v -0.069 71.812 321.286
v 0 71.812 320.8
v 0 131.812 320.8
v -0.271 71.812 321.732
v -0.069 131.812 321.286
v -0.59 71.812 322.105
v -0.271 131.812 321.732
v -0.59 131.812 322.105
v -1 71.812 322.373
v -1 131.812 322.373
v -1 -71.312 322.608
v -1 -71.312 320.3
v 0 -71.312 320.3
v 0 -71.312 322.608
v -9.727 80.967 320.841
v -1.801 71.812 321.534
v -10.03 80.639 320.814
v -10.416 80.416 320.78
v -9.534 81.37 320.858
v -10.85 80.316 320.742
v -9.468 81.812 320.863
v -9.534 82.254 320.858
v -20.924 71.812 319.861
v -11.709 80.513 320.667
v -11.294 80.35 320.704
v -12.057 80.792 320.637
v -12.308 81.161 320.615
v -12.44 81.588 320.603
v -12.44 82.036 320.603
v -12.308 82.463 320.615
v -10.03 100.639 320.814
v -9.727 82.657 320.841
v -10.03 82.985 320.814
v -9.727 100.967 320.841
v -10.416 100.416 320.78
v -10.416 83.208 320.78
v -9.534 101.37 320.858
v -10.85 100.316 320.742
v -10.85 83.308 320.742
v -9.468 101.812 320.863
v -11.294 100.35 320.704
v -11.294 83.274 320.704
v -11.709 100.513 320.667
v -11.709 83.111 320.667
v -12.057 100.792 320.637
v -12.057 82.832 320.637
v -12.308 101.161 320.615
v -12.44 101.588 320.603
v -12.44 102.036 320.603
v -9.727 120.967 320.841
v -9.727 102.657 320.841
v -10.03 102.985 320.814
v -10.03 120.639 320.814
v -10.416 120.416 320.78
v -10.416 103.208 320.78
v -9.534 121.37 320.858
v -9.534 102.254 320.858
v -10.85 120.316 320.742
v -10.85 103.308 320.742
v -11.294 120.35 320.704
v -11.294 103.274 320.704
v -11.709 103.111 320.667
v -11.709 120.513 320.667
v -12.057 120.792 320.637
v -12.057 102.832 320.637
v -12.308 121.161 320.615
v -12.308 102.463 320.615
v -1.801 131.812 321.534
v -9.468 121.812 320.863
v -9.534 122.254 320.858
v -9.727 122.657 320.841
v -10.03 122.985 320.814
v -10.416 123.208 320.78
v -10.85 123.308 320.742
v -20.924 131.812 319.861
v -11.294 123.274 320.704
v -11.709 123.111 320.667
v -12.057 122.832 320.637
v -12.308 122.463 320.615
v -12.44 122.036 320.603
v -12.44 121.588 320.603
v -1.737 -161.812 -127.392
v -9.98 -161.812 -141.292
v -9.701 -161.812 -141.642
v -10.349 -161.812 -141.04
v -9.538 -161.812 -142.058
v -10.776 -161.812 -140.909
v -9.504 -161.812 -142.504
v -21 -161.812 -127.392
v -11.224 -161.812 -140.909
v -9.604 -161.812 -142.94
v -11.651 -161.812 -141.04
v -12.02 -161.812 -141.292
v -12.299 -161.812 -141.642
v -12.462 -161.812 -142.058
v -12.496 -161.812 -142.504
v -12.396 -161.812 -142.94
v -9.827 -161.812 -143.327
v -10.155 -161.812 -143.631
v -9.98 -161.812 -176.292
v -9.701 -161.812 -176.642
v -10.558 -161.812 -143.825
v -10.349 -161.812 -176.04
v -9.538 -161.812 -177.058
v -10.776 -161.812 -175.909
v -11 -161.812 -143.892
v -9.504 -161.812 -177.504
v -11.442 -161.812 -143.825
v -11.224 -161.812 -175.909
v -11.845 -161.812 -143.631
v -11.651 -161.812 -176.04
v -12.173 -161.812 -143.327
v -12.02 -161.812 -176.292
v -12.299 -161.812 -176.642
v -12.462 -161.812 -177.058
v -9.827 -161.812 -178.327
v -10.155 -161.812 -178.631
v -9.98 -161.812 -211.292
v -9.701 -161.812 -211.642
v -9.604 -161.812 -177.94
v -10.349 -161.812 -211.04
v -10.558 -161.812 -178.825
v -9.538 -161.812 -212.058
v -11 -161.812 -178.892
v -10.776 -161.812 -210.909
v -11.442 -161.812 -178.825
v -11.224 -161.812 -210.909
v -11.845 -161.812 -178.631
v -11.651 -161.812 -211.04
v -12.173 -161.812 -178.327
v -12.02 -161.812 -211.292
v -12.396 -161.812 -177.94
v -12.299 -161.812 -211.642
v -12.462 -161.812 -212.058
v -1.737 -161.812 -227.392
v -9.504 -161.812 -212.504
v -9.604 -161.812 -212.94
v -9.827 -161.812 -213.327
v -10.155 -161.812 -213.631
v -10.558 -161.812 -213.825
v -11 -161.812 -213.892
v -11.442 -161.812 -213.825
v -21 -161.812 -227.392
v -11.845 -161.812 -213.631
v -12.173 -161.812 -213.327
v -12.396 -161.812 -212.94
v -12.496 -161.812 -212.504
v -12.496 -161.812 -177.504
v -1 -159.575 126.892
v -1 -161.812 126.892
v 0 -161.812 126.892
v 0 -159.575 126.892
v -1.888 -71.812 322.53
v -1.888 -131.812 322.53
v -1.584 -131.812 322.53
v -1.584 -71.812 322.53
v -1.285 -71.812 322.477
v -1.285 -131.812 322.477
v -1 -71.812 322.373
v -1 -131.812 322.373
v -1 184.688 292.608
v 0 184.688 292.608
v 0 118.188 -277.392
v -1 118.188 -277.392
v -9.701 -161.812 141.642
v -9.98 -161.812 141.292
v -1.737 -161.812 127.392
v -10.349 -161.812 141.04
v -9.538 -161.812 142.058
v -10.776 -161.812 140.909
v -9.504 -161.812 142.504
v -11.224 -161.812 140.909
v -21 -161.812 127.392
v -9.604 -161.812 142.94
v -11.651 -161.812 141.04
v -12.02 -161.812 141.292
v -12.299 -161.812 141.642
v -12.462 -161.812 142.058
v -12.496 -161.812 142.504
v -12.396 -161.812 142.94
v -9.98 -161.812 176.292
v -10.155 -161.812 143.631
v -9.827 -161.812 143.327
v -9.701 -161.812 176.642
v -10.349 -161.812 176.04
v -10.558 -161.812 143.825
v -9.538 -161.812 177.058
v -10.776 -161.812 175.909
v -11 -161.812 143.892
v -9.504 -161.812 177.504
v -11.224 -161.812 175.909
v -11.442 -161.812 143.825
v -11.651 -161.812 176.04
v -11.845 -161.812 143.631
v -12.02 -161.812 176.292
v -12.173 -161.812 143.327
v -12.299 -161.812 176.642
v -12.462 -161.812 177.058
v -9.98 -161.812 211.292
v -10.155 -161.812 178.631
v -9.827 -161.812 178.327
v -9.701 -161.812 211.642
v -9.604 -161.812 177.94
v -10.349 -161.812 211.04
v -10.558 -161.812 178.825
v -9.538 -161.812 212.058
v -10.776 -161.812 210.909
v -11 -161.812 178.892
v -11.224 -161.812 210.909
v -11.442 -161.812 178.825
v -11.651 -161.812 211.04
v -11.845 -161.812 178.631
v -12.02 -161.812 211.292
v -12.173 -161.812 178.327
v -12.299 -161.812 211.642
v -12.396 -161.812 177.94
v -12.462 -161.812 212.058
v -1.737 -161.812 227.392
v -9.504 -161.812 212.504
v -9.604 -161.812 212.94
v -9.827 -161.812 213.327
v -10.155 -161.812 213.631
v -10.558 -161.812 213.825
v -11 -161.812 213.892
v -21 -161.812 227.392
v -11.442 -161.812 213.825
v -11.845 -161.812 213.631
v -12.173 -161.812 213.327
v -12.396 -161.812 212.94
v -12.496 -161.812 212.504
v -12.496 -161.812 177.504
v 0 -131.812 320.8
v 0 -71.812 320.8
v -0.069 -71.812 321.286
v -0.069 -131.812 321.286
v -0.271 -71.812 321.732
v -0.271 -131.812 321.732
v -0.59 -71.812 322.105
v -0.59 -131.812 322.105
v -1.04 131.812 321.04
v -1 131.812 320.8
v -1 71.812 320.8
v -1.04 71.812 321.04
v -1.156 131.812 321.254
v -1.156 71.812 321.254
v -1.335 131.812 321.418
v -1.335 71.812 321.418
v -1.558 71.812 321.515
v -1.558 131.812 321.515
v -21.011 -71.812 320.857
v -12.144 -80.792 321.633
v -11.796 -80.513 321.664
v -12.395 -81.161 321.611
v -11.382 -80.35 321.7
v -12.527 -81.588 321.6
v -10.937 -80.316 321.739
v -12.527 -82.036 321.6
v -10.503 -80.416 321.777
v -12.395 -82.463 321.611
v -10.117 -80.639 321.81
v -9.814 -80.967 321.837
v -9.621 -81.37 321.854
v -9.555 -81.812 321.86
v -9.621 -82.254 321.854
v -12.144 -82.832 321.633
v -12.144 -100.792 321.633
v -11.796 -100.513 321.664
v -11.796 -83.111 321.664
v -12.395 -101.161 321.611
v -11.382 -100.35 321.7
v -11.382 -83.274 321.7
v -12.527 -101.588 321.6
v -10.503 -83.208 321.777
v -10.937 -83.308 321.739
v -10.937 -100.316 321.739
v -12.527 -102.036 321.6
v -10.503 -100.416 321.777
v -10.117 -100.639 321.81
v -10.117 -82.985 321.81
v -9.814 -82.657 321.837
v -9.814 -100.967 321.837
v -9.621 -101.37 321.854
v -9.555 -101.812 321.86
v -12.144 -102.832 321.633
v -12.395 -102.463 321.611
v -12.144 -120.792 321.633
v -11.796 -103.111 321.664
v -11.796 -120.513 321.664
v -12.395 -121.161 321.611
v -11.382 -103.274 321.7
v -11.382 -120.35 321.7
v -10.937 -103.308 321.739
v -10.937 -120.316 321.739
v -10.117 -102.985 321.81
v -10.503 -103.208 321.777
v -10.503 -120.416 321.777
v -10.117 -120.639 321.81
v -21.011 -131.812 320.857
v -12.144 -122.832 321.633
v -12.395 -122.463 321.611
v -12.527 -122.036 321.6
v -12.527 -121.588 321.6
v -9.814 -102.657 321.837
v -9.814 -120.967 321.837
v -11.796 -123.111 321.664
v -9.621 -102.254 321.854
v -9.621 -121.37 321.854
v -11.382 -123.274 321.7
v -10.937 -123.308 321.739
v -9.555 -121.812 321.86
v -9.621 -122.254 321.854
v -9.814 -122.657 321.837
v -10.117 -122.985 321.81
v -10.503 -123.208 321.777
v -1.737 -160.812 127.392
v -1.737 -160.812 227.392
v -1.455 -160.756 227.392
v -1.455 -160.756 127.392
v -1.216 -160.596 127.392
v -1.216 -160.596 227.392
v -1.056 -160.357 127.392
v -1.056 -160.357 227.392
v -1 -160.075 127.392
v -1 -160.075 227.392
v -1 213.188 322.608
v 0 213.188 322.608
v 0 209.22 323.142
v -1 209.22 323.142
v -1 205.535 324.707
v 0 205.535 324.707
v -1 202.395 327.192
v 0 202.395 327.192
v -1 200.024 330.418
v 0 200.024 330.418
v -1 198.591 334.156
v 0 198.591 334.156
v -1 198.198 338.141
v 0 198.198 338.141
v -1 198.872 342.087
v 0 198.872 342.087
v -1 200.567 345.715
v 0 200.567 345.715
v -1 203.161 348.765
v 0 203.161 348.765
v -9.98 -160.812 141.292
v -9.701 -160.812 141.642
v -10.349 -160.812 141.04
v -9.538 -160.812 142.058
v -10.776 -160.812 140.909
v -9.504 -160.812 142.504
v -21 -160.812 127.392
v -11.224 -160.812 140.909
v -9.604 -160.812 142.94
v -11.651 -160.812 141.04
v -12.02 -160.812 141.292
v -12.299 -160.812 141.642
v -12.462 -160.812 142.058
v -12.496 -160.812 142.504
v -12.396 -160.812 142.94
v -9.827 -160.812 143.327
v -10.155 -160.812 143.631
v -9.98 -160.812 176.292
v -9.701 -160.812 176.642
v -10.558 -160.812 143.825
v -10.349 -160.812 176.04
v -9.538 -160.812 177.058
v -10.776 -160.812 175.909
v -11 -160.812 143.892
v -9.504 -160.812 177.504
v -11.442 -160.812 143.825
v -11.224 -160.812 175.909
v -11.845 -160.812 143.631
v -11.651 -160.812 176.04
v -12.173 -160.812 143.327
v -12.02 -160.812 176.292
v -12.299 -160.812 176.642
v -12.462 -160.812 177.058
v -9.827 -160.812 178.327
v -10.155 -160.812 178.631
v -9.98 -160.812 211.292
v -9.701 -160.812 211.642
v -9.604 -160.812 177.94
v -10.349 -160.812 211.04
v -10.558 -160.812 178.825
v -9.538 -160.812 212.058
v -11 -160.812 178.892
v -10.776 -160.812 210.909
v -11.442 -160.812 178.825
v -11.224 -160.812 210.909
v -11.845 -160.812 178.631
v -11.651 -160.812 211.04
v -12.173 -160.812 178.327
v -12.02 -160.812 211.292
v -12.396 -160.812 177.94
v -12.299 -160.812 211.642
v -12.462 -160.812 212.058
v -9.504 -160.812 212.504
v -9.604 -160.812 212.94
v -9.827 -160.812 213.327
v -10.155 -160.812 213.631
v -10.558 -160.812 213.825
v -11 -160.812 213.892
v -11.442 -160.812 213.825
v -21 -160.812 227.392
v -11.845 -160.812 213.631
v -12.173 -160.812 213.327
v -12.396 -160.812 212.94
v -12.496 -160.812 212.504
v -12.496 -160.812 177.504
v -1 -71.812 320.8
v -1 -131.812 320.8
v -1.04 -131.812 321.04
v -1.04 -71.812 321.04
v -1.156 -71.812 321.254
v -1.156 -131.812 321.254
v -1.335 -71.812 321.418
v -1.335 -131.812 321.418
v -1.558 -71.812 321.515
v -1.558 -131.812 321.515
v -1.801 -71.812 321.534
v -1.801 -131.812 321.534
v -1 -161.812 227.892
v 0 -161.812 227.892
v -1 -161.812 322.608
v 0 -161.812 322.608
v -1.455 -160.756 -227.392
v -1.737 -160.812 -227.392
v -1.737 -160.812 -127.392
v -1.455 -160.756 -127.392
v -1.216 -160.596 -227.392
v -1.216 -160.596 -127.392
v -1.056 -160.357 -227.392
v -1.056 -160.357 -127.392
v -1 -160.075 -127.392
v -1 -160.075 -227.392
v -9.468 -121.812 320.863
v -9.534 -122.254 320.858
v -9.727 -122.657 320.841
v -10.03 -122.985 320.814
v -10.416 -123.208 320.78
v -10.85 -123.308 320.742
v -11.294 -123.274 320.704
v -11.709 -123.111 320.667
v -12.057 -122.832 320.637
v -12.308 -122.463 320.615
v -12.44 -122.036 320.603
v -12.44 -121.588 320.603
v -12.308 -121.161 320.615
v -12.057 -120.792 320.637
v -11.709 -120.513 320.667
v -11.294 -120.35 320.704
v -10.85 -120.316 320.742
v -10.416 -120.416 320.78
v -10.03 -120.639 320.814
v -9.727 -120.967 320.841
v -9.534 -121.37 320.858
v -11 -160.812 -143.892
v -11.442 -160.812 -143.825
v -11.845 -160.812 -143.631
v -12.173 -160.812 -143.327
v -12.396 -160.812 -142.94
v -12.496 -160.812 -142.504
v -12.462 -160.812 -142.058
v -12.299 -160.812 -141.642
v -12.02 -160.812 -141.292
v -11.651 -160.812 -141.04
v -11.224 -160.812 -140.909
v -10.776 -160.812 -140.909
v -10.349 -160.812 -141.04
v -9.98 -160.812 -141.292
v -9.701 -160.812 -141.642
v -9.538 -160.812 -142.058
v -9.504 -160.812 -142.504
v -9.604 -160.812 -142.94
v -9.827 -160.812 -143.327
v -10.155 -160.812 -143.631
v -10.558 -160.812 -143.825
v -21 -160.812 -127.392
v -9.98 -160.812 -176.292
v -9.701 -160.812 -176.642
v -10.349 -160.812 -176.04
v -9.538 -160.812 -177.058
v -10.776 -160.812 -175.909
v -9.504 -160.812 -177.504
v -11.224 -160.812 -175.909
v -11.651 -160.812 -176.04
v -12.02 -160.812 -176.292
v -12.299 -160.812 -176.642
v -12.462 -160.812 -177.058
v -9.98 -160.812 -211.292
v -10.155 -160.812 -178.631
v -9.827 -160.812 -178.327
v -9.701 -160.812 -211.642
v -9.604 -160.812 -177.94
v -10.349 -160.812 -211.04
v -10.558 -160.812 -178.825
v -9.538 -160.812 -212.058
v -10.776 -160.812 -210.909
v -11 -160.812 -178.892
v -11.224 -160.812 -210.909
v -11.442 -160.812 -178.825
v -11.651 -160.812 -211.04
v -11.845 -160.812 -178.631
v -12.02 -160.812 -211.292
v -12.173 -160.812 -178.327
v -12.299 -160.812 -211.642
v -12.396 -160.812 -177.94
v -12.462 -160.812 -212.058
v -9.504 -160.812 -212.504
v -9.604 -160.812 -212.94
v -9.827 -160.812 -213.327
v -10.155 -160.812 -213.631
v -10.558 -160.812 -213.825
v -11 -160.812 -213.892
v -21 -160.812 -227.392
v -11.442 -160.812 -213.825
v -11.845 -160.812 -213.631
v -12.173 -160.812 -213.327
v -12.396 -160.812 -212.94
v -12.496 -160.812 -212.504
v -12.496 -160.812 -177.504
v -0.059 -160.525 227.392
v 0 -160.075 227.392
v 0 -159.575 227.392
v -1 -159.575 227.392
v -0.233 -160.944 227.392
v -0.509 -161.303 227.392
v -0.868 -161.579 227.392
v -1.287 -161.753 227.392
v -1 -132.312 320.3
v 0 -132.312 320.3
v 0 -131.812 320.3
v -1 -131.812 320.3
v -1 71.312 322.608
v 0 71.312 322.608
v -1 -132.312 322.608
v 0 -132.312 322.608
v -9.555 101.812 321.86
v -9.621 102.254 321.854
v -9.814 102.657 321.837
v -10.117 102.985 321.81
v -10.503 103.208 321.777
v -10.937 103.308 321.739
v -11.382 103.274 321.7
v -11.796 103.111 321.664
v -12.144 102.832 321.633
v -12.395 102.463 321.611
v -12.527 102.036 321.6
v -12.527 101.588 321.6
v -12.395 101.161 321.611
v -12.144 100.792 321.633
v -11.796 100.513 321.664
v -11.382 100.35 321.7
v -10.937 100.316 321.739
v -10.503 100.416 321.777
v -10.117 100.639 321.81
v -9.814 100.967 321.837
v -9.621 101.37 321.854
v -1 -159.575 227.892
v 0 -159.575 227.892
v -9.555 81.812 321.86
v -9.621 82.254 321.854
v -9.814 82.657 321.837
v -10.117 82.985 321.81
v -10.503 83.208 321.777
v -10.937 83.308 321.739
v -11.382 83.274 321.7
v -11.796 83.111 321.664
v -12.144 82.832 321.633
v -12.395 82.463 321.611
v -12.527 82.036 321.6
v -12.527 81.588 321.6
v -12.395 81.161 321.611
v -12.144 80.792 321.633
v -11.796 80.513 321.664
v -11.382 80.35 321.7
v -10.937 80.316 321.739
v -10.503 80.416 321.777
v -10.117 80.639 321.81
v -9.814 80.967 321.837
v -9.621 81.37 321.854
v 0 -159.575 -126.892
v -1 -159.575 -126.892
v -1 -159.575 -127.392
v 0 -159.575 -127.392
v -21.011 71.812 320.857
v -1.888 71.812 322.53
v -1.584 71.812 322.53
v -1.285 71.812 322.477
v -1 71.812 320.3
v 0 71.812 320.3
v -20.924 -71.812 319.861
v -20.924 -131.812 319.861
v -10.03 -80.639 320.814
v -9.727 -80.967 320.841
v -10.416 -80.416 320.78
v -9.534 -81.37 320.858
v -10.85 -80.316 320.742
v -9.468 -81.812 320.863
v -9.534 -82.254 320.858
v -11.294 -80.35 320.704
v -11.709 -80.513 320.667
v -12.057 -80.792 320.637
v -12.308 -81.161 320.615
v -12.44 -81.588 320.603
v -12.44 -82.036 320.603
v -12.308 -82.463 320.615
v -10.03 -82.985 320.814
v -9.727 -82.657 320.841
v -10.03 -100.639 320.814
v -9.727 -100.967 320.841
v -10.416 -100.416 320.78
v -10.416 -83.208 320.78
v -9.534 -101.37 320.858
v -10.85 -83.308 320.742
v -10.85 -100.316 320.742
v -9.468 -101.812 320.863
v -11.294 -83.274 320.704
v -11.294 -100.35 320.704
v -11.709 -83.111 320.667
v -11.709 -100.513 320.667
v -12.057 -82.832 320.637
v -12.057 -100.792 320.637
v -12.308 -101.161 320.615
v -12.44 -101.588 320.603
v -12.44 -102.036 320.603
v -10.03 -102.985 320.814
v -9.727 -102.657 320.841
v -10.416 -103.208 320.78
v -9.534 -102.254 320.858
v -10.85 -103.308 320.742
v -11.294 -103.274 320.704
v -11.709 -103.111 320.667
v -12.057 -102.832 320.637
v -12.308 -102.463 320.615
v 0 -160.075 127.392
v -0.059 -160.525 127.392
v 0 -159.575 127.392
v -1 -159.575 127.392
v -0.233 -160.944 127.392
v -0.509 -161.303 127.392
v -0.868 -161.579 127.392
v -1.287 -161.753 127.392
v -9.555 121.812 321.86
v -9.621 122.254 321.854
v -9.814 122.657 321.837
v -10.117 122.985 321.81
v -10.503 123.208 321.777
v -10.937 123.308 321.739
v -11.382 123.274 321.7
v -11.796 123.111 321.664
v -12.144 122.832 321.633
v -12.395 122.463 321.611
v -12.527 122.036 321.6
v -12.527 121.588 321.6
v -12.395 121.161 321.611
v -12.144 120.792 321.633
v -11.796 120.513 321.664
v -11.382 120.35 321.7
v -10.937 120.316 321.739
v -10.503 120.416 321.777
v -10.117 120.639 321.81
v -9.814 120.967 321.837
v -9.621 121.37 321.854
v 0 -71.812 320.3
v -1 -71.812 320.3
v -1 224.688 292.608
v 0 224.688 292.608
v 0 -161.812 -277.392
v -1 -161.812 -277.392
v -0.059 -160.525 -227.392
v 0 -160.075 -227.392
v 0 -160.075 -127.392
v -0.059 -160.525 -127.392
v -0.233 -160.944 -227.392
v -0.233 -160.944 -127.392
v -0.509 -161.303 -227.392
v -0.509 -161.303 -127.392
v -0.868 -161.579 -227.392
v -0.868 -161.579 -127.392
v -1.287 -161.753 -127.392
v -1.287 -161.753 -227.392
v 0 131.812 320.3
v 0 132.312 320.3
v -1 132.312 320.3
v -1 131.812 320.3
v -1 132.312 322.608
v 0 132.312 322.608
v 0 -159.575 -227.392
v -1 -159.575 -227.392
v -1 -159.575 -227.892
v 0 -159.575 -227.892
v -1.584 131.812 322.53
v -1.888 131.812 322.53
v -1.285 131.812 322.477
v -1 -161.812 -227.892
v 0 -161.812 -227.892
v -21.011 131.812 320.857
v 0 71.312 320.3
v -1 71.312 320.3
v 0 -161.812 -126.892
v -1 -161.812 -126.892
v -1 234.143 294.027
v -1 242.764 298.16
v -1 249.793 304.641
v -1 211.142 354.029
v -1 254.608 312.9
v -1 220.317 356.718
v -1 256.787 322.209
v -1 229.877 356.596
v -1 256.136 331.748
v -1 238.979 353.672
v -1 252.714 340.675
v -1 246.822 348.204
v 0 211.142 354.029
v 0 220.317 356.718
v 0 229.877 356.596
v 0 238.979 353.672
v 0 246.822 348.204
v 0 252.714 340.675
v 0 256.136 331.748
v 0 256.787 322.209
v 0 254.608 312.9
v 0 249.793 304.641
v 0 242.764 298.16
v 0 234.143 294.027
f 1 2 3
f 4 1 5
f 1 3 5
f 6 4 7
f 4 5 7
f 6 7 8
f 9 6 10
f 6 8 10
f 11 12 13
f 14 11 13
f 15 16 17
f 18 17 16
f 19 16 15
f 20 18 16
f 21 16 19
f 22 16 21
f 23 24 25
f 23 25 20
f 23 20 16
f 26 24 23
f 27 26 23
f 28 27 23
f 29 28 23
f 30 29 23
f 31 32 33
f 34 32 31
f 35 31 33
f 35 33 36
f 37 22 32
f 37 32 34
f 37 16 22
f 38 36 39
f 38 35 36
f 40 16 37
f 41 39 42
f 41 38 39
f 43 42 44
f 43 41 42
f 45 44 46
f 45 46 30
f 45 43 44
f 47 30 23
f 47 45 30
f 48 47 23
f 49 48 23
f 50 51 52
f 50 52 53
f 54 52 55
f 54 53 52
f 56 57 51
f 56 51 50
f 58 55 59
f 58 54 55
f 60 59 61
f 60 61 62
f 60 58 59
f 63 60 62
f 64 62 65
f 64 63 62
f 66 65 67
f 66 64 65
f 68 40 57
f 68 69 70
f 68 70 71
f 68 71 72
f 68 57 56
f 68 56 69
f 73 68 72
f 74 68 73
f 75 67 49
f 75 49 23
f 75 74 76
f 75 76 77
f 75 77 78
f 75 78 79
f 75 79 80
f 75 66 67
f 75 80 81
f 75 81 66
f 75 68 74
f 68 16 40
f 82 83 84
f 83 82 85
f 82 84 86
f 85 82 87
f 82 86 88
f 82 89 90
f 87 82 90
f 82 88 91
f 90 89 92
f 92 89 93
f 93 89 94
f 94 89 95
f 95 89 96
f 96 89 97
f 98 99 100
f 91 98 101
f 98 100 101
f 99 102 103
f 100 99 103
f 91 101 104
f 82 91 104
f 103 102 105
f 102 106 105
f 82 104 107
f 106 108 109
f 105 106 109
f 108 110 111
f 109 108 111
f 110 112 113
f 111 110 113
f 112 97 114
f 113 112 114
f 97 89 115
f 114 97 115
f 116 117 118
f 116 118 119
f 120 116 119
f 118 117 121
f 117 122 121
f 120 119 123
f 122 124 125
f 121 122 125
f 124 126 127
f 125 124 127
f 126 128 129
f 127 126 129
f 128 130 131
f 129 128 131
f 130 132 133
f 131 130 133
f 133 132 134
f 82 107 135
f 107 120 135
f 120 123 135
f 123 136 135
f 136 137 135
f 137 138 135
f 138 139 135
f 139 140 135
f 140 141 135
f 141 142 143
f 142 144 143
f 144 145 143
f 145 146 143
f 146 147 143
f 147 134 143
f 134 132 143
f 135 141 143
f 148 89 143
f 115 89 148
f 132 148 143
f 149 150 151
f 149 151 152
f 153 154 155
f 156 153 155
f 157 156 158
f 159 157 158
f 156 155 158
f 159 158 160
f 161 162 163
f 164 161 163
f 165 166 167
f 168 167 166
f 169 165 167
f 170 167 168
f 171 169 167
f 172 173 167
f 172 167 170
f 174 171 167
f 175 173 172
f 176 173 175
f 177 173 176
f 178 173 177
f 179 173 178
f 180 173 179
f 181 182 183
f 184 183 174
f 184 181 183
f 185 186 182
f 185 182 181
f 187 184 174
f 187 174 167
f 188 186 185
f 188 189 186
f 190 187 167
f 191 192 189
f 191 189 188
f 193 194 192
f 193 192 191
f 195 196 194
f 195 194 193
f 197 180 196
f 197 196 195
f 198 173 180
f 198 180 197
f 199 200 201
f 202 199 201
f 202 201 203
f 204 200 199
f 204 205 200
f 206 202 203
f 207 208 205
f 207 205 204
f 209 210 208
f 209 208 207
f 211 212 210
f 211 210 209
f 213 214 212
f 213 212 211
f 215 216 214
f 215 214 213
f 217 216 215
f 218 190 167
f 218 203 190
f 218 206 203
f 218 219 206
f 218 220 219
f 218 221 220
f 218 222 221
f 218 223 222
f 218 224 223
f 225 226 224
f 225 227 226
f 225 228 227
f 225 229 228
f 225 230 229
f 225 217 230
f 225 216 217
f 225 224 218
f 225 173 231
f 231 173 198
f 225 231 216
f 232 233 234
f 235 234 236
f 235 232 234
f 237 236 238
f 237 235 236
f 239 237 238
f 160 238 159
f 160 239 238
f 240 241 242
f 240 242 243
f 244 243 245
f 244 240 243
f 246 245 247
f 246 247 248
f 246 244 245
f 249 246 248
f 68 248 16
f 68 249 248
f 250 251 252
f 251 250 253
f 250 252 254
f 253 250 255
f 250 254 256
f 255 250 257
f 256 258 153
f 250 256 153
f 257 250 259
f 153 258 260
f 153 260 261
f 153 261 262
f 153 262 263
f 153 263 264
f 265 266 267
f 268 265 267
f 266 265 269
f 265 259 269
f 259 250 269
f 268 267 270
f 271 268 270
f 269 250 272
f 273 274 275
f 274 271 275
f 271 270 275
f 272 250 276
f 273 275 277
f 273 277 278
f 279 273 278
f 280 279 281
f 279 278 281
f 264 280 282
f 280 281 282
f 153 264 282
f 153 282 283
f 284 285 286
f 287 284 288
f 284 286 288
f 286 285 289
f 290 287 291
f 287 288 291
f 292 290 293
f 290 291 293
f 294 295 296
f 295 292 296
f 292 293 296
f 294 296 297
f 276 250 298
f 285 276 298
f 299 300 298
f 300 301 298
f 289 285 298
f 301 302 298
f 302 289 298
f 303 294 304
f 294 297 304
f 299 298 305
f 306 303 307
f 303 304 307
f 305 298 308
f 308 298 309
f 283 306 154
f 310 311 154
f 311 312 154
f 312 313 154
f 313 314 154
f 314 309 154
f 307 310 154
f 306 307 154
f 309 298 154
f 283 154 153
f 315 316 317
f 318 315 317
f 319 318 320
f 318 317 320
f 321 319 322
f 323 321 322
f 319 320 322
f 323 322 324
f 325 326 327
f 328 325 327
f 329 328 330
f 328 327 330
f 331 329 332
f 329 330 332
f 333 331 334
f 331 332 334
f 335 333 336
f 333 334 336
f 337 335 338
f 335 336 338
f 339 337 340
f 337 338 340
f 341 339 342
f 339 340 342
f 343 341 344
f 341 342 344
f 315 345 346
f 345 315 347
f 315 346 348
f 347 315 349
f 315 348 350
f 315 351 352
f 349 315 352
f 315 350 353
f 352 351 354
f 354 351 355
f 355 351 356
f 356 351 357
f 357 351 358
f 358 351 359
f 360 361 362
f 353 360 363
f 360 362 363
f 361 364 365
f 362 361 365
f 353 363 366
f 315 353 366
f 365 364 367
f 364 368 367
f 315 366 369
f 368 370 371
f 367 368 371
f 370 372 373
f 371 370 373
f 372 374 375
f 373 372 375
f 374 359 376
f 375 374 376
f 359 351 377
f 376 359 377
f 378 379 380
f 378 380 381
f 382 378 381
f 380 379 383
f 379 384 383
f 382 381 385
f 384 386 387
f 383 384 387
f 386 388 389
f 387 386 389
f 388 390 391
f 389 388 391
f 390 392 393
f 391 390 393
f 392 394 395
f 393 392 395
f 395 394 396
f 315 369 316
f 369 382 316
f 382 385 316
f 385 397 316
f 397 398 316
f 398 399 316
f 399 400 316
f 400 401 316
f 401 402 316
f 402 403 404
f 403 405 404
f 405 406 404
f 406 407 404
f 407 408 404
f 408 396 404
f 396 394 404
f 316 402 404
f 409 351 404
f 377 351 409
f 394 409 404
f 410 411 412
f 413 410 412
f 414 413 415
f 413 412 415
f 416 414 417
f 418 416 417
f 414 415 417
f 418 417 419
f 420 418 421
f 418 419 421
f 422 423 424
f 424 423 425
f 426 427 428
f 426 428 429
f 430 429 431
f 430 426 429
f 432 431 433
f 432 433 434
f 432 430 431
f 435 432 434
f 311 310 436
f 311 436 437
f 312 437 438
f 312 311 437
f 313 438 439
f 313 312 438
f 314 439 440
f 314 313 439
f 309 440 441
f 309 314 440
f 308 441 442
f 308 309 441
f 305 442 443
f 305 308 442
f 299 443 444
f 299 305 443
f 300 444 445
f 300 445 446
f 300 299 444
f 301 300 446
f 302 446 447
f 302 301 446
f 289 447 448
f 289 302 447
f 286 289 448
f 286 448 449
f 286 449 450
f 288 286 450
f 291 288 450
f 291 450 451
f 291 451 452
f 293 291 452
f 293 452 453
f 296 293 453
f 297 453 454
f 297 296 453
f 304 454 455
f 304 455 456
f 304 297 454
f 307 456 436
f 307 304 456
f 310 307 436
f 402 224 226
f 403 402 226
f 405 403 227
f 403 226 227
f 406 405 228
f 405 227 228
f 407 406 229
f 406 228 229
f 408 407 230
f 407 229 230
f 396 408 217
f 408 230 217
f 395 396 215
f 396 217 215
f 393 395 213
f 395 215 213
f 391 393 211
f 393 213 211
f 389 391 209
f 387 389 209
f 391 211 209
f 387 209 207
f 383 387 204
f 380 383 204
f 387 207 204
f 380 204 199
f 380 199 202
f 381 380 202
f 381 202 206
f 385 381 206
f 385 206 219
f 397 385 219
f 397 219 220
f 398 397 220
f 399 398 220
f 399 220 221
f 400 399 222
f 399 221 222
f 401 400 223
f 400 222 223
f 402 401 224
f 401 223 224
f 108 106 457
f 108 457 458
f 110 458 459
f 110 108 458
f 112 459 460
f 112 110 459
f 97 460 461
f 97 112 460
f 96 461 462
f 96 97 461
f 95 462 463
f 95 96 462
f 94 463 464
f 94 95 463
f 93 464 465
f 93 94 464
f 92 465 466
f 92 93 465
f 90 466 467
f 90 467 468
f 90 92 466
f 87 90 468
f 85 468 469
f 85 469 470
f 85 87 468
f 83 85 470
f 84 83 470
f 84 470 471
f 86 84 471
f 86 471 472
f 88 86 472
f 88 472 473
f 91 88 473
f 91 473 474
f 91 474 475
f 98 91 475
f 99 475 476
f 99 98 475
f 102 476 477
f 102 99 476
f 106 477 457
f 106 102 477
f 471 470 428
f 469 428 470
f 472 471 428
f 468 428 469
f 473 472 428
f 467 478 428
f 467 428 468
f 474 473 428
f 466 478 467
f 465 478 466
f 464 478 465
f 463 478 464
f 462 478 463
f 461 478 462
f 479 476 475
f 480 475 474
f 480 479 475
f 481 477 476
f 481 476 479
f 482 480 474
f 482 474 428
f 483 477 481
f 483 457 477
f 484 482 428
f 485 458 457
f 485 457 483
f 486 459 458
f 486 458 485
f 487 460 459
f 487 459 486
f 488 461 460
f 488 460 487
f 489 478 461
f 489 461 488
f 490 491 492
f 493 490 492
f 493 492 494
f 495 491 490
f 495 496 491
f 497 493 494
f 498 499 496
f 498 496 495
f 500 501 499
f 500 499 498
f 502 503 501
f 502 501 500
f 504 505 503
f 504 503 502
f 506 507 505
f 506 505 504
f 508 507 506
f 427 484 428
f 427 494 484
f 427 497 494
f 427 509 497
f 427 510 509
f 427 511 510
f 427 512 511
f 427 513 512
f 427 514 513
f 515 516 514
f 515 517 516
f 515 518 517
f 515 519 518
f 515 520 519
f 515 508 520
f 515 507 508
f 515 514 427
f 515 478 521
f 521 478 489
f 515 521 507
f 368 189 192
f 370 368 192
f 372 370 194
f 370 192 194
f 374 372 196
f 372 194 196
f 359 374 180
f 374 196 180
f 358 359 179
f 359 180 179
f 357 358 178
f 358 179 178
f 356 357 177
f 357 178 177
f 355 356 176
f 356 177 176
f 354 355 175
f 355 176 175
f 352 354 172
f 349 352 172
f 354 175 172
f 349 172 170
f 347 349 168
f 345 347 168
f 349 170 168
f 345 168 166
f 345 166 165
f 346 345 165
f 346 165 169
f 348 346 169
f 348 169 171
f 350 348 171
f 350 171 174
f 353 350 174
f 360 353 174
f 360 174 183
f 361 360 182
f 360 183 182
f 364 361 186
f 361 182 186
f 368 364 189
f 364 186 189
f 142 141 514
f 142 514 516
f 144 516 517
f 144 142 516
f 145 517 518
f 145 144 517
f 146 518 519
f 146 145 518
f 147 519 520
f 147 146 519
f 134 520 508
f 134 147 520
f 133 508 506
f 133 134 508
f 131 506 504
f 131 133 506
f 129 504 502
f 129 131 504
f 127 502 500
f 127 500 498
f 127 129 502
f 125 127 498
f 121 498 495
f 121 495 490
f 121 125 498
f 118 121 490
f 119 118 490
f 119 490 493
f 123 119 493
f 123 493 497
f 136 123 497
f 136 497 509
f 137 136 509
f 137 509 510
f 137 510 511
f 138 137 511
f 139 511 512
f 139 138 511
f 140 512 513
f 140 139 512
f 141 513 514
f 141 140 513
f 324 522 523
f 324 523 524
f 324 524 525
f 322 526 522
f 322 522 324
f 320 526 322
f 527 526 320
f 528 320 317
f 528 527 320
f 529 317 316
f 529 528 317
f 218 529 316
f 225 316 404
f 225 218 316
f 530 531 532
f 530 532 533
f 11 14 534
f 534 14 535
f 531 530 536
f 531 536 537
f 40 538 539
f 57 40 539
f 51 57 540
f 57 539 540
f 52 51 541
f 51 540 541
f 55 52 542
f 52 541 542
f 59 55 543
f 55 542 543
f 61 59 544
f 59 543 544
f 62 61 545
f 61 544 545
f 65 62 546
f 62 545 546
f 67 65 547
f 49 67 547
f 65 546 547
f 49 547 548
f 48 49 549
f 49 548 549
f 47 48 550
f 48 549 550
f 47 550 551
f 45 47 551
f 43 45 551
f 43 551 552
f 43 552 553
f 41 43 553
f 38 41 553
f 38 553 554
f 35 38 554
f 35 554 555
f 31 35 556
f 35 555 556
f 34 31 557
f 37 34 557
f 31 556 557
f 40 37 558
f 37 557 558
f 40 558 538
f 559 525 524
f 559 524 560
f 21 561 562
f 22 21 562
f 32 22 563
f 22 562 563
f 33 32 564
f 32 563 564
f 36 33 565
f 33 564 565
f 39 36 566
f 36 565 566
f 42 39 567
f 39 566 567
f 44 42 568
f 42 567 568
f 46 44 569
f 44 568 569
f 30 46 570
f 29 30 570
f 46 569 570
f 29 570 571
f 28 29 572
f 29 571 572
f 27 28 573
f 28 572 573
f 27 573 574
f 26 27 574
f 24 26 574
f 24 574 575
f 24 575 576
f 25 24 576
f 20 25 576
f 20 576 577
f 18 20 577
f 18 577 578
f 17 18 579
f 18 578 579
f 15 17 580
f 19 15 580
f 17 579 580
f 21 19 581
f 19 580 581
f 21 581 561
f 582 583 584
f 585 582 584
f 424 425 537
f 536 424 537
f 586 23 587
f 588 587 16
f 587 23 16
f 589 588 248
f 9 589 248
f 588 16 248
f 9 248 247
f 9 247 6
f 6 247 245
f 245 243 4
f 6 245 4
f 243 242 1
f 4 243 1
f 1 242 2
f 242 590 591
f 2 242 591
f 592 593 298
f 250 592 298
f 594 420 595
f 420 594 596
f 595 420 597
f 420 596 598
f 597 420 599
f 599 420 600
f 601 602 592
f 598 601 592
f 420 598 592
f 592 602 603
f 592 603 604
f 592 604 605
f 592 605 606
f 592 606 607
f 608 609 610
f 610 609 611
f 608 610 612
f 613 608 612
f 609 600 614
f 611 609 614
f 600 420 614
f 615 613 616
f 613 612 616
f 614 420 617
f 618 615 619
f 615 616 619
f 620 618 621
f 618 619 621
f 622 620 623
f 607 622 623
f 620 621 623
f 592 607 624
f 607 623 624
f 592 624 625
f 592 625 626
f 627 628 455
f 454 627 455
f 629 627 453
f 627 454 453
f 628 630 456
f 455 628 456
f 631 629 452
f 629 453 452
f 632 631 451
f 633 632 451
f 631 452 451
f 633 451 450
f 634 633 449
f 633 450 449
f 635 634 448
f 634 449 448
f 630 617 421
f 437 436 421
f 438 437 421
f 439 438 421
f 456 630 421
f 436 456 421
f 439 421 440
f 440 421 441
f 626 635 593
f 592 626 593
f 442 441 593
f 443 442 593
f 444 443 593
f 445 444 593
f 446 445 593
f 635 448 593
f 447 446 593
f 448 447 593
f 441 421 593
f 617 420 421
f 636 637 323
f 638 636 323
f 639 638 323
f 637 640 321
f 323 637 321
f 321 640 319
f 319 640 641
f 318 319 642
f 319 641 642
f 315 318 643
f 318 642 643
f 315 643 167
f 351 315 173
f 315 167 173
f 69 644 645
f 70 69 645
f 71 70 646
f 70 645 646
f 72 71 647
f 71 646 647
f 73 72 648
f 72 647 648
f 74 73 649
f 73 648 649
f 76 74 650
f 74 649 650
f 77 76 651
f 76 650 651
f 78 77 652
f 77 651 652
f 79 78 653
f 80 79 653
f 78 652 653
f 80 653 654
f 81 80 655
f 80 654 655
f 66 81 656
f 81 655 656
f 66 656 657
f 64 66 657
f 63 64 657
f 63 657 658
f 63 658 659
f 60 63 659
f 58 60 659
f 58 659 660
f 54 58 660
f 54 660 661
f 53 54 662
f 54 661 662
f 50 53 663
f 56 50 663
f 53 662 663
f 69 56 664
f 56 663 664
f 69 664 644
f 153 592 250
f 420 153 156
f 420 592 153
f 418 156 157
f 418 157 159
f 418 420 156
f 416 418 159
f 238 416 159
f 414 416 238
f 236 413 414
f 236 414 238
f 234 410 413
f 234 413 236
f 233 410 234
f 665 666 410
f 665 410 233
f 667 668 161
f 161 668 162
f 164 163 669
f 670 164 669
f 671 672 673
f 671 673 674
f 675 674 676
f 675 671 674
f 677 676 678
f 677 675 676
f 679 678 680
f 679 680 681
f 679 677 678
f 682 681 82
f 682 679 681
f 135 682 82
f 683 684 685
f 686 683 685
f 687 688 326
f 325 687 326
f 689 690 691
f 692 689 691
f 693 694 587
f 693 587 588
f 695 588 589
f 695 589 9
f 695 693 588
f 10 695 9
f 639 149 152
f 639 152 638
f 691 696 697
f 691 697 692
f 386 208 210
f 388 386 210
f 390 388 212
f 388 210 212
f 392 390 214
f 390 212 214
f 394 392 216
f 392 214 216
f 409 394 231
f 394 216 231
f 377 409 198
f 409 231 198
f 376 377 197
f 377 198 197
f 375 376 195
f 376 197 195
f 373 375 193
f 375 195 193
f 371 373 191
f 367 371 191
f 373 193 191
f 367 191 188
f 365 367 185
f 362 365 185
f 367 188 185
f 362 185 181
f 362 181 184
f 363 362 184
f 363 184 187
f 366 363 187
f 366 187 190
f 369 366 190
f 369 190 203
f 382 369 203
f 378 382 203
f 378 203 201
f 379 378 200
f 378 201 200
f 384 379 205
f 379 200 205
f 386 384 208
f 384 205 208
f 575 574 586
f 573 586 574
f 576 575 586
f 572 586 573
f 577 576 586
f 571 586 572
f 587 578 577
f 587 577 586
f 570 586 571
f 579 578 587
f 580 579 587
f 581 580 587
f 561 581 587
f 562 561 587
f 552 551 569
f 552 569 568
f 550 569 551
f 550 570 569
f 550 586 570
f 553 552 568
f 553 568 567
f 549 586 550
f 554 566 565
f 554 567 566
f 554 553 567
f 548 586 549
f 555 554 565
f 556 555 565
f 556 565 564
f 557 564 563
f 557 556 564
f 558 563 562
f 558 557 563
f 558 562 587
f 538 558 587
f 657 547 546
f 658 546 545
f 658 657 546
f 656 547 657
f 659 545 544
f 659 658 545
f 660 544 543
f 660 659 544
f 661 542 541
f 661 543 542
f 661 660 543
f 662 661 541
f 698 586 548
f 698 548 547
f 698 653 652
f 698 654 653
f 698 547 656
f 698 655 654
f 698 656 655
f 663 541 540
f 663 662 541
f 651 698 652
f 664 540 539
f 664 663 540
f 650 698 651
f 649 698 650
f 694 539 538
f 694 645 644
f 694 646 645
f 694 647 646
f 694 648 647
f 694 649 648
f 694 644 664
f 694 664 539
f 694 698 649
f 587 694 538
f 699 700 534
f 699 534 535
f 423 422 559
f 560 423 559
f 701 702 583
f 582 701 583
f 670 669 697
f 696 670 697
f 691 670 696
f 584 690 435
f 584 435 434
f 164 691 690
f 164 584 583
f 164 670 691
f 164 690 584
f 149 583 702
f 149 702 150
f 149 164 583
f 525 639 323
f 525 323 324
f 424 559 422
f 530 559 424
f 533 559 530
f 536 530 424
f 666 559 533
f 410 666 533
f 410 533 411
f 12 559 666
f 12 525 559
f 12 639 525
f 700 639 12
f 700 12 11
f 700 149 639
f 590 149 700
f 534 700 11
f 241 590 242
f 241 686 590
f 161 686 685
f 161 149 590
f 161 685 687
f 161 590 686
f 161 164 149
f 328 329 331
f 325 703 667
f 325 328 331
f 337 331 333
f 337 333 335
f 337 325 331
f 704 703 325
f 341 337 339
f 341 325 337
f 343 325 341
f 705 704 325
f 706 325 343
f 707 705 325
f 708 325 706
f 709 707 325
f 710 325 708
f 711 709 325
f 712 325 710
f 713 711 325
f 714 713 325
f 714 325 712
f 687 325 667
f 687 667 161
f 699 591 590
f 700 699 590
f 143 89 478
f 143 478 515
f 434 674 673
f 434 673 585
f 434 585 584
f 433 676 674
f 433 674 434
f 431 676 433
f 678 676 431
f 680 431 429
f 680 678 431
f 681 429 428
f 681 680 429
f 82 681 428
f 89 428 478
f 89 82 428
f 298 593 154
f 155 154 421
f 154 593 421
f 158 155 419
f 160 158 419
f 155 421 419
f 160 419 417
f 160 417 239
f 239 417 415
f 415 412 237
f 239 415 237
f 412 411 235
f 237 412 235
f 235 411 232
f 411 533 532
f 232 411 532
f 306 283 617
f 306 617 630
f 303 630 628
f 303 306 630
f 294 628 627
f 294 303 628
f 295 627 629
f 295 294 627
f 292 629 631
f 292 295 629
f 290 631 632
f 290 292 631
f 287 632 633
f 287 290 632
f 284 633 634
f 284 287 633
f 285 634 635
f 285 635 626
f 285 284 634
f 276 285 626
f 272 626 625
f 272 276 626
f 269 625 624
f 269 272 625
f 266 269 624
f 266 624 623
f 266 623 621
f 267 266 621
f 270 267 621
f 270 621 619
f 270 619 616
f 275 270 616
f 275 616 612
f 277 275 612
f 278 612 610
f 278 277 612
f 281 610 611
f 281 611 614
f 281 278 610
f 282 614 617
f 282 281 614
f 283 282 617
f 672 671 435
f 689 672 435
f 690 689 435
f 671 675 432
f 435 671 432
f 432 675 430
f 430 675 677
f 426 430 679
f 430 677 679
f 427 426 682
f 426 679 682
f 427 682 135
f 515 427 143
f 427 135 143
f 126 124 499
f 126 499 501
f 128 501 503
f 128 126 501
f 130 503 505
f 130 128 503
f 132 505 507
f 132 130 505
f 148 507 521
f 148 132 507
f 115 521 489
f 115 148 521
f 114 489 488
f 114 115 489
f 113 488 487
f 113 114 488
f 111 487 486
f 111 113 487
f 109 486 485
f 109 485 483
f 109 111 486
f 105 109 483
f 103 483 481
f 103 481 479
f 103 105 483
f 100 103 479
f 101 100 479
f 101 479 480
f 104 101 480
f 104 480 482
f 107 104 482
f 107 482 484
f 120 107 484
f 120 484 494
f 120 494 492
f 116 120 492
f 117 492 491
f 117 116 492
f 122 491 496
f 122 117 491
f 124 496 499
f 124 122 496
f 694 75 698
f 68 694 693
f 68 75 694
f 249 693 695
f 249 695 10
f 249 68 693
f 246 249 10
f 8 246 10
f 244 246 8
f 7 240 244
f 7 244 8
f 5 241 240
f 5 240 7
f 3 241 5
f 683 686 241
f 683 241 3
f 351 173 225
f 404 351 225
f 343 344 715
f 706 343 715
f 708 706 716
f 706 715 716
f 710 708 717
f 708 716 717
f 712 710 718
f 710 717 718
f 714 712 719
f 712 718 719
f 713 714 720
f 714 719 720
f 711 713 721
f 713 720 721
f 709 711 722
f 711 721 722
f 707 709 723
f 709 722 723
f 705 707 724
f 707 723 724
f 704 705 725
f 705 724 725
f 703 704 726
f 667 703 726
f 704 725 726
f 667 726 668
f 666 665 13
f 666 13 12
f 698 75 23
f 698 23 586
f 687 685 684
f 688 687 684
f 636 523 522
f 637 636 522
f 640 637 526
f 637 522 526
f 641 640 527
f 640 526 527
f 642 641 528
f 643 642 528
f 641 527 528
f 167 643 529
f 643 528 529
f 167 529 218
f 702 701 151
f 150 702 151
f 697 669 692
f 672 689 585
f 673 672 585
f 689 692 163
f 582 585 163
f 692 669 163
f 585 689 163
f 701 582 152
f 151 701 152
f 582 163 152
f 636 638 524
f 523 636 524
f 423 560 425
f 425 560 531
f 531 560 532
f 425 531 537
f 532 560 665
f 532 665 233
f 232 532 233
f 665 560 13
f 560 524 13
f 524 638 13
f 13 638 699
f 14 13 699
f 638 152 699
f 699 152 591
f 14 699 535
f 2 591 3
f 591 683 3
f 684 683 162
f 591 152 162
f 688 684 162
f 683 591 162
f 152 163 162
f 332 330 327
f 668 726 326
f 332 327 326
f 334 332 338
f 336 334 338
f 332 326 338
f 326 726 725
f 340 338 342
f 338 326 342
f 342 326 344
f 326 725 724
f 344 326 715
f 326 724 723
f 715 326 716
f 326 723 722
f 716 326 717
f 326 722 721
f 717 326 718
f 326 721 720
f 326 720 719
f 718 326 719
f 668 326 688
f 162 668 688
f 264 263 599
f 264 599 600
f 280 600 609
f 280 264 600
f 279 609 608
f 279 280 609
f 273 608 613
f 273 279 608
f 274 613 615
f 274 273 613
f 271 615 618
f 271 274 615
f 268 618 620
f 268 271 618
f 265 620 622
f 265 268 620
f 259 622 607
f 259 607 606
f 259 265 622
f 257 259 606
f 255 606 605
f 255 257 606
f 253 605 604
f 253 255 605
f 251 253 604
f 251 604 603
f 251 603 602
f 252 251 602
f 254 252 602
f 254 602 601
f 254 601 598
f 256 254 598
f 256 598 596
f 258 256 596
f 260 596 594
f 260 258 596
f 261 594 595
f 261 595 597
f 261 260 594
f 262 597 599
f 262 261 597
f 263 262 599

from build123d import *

# Parameters (mm, degrees)
BASE_FLANGE1_DEPTH            = 1
EDGE_FLANGE1_STRIP_W          = 5.4732
EDGE_FLANGE1_STRIP_H          = 1
EDGE_FLANGE1_STRIP_CUT_DEPTH  = 100
EDGE_FLANGE1_RELIEF_W         = 5.9732
EDGE_FLANGE1_RELIEF_H         = 0.5
EDGE_FLANGE1_RELIEF_CUT_DEPTH = 1
EDGE_FLANGE1_DEPTH            = 100
EDGE_FLANGE1_PROFILE_W        = 100
EDGE_FLANGE1_PROFILE_H        = 19.2634
EDGE_FLANGE1_PROFILE_R        = 1.5
EDGE_FLANGE1_FLAT_DEPTH       = 1
EDGE_FLANGE2_START            = -132.311951656
EDGE_FLANGE2_DEPTH            = 61
EDGE_FLANGE2_2_DEPTH          = 0.5
EDGE_FLANGE2_START_2          = -71.811951656
EDGE_FLANGE2_3_DEPTH          = 0.5
EDGE_FLANGE2_START_3          = -131.811951656
EDGE_FLANGE2_4_DEPTH          = 60
EDGE_FLANGE2_START_4          = -321.467617465
EDGE_FLANGE2_5_OUTLINE_R      = 1.5
EDGE_FLANGE2_5_DEPTH          = 1.000000001


with BuildPart() as part:
    # Base-Flange1: sheet metal written as solids
    # Sketch1 → Base-Flange1 (new body)
    with BuildSketch(Plane(origin=(0, 0, 0), x_dir=(0, 0, -1), z_dir=(1, 0, 0))):
        with BuildLine():
            Line((-292.608082875, 184.688048344), (277.391917125, 118.188048344))
            Line((277.391917125, 118.188048344), (277.391917125, -161.811951656))
            Line((277.391917125, -161.811951656), (-322.608082875, -161.811951656))
            Line((-322.608082875, -161.811951656), (-322.608082875, 188.188048344))
            Line((-322.608082875, 188.188048344), (-322.608082875, 213.188048344))
            ThreePointArc((-322.608082875, 213.188048344), (-332.239042701, 199.181856584), (-348.764537222, 203.161407511))
            ThreePointArc((-348.764537222, 203.161407511), (-336.339280516, 254.75856393), (-292.608082875, 224.688048344))
            Line((-292.608082875, 224.688048344), (-292.608082875, 184.688048344))
        make_face()
    extrude(amount=-BASE_FLANGE1_DEPTH)

    # Edge-Flange1: sheet metal written as solids
    # Edge-Flange1 strip (on a plane across the edge) → Edge-Flange1 strip cut (cut)
    with BuildSketch(Plane(origin=(-1, -161.811951656, -227.391917125), x_dir=(0, 1, 0), z_dir=(0, 0, 1))):
        with Locations((-1, -0.5)):
            Rectangle(EDGE_FLANGE1_STRIP_W, EDGE_FLANGE1_STRIP_H)
    edge_flange1_strip_cut = extrude(amount=EDGE_FLANGE1_STRIP_CUT_DEPTH, mode=Mode.SUBTRACT)

    # Edge-Flange1 relief (on the sheet) → Edge-Flange1 relief cut (cut)
    with BuildSketch(Plane(origin=(-1, -160.075351656, -227.391917125), x_dir=(0, 1, 0), z_dir=(-1, 0, 0))):
        with Locations((-2.4866, 0.25)):
            Rectangle(EDGE_FLANGE1_RELIEF_W, EDGE_FLANGE1_RELIEF_H)
        with Locations((-2.4866, -100.25)):
            Rectangle(EDGE_FLANGE1_RELIEF_W, EDGE_FLANGE1_RELIEF_H)
    edge_flange1_relief_cut = extrude(amount=-EDGE_FLANGE1_RELIEF_CUT_DEPTH, mode=Mode.SUBTRACT)

    # Edge-Flange1 bend section (on a plane across the edge) → Edge-Flange1 (add)
    with BuildSketch(Plane(origin=(-1, -161.811951656, -227.391917125), x_dir=(0, 1, 0), z_dir=(0, 0, 1))):
        with BuildLine():
            Line((0, 0.7366), (1, 0.7366))
            ThreePointArc((1, 0.7366), (1.215745145, 0.215745145), (1.7366, 0))
            Line((1.7366, 0), (1.7366, -1))
            ThreePointArc((1.7366, -1), (0.508638364, -0.491361636), (0, 0.7366))
        make_face()
    edge_flange1 = extrude(amount=EDGE_FLANGE1_DEPTH)

    # Edge-Flange1 profile (on flange) → Edge-Flange1 flat (add)
    with BuildSketch(Plane(origin=(-1, -161.811951656, 0), x_dir=(0, 0, -1), z_dir=(0, 1, 0))):
        with Locations((177.391917125, 10.3683)):
            Rectangle(EDGE_FLANGE1_PROFILE_W, EDGE_FLANGE1_PROFILE_H)
        with Locations((142.391917125, 10)):
            Circle(EDGE_FLANGE1_PROFILE_R, mode=Mode.SUBTRACT)
        with Locations((212.391917125, 10)):
            Circle(EDGE_FLANGE1_PROFILE_R, mode=Mode.SUBTRACT)
        with Locations((177.391917125, 10)):
            Circle(EDGE_FLANGE1_PROFILE_R, mode=Mode.SUBTRACT)
    edge_flange1_flat = extrude(amount=EDGE_FLANGE1_FLAT_DEPTH)

    # Mirror1: Edge-Flange1 strip cut, Edge-Flange1 relief cut, Edge-Flange1, Edge-Flange1 flat across plane
    add(edge_flange1_strip_cut.mirror(Plane.XY), mode=Mode.SUBTRACT)
    add(edge_flange1_relief_cut.mirror(Plane.XY), mode=Mode.SUBTRACT)
    add(edge_flange1.mirror(Plane.XY))
    add(edge_flange1_flat.mirror(Plane.XY))

    # Edge-Flange2: read off the stored shape, not the designer's step
    # Edge-Flange2 outline → Edge-Flange2 (cut)
    with BuildSketch(Plane(origin=(0, 0, 0), x_dir=(1, 0, 0), z_dir=(0, 1, 0)).offset(EDGE_FLANGE2_START)):
        with BuildLine():
            Line((0, -322.608082875), (0, -320.800405196))
            ThreePointArc((0, -320.800405196), (-0.271171885, -321.73223136), (-1, -322.373046287))
            Line((-1, -322.373046287), (-1, -322.608082875))
            Line((-1, -322.608082875), (0, -322.608082875))
        make_face()
    edge_flange2 = extrude(amount=EDGE_FLANGE2_DEPTH, mode=Mode.SUBTRACT)

    # Edge-Flange2 2 outline → Edge-Flange2 2 (cut)
    with BuildSketch(Plane(origin=(0, 0, 0), x_dir=(1, 0, 0), z_dir=(0, 1, 0)).offset(EDGE_FLANGE2_START)):
        with BuildLine():
            Line((0, -320.300405196), (-1, -320.300405196))
            Line((-1, -320.300405196), (-1, -322.373046287))
            ThreePointArc((-1, -322.373046287), (-0.271171885, -321.73223136), (0, -320.800405196))
            Line((0, -320.800405196), (0, -320.300405196))
        make_face()
    edge_flange2_2 = extrude(amount=EDGE_FLANGE2_2_DEPTH, mode=Mode.SUBTRACT)

    # Edge-Flange2 3 outline → Edge-Flange2 3 (cut)
    with BuildSketch(Plane(origin=(0, 0, 0), x_dir=(1, 0, 0), z_dir=(0, 1, 0)).offset(EDGE_FLANGE2_START_2)):
        with BuildLine():
            Line((0, -320.300405196), (-1, -320.300405196))
            Line((-1, -320.300405196), (-1, -322.373046287))
            ThreePointArc((-1, -322.373046287), (-0.271171885, -321.73223136), (0, -320.800405196))
            Line((0, -320.800405196), (0, -320.300405196))
        make_face()
    edge_flange2_3 = extrude(amount=EDGE_FLANGE2_3_DEPTH, mode=Mode.SUBTRACT)

    # Edge-Flange2 4 outline → Edge-Flange2 4 (add)
    with BuildSketch(Plane(origin=(0, 0, 0), x_dir=(1, 0, 0), z_dir=(0, 1, 0)).offset(EDGE_FLANGE2_START_3)):
        with BuildLine():
            Line((-1, -322.373046287), (-1, -320.800405196))
            ThreePointArc((-1, -320.800405196), (-1.238960253, -321.343483682), (-1.80079892, -321.53420221))
            Line((-1.80079892, -321.53420221), (-20.923893962, -319.861148183))
            Line((-20.923893962, -319.861148183), (-21.011049705, -320.857342881))
            Line((-21.011049705, -320.857342881), (-1.887954663, -322.530396908))
            ThreePointArc((-1.887954663, -322.530396908), (-1.433585428, -322.510364765), (-1, -322.373046287))
        make_face()
    edge_flange2_4 = extrude(amount=EDGE_FLANGE2_4_DEPTH)

    # Edge-Flange2 5 outline → Edge-Flange2 5 (cut)
    with BuildSketch(Plane(origin=(0, 0, 0), x_dir=(0.9961946980917458, 0, 0.0871557427476548), z_dir=(0.0871557427476548, 0, -0.9961946980917459)).offset(EDGE_FLANGE2_START_4)):
        with Locations((17.033463718, 121.811951656)):
            Circle(EDGE_FLANGE2_5_OUTLINE_R)
        with Locations((17.033463718, 101.811951656)):
            Circle(EDGE_FLANGE2_5_OUTLINE_R)
        with Locations((17.033463718, 81.811951656)):
            Circle(EDGE_FLANGE2_5_OUTLINE_R)
    edge_flange2_5 = extrude(amount=EDGE_FLANGE2_5_DEPTH, mode=Mode.SUBTRACT)

    # Mirror2: Edge-Flange2, Edge-Flange2 2, Edge-Flange2 3, Edge-Flange2 4, Edge-Flange2 5 across plane
    add(edge_flange2.mirror(Plane.ZX), mode=Mode.SUBTRACT)
    add(edge_flange2_2.mirror(Plane.ZX), mode=Mode.SUBTRACT)
    add(edge_flange2_3.mirror(Plane.ZX), mode=Mode.SUBTRACT)
    add(edge_flange2_4.mirror(Plane.ZX))
    add(edge_flange2_5.mirror(Plane.ZX), mode=Mode.SUBTRACT)


solid = part.part
